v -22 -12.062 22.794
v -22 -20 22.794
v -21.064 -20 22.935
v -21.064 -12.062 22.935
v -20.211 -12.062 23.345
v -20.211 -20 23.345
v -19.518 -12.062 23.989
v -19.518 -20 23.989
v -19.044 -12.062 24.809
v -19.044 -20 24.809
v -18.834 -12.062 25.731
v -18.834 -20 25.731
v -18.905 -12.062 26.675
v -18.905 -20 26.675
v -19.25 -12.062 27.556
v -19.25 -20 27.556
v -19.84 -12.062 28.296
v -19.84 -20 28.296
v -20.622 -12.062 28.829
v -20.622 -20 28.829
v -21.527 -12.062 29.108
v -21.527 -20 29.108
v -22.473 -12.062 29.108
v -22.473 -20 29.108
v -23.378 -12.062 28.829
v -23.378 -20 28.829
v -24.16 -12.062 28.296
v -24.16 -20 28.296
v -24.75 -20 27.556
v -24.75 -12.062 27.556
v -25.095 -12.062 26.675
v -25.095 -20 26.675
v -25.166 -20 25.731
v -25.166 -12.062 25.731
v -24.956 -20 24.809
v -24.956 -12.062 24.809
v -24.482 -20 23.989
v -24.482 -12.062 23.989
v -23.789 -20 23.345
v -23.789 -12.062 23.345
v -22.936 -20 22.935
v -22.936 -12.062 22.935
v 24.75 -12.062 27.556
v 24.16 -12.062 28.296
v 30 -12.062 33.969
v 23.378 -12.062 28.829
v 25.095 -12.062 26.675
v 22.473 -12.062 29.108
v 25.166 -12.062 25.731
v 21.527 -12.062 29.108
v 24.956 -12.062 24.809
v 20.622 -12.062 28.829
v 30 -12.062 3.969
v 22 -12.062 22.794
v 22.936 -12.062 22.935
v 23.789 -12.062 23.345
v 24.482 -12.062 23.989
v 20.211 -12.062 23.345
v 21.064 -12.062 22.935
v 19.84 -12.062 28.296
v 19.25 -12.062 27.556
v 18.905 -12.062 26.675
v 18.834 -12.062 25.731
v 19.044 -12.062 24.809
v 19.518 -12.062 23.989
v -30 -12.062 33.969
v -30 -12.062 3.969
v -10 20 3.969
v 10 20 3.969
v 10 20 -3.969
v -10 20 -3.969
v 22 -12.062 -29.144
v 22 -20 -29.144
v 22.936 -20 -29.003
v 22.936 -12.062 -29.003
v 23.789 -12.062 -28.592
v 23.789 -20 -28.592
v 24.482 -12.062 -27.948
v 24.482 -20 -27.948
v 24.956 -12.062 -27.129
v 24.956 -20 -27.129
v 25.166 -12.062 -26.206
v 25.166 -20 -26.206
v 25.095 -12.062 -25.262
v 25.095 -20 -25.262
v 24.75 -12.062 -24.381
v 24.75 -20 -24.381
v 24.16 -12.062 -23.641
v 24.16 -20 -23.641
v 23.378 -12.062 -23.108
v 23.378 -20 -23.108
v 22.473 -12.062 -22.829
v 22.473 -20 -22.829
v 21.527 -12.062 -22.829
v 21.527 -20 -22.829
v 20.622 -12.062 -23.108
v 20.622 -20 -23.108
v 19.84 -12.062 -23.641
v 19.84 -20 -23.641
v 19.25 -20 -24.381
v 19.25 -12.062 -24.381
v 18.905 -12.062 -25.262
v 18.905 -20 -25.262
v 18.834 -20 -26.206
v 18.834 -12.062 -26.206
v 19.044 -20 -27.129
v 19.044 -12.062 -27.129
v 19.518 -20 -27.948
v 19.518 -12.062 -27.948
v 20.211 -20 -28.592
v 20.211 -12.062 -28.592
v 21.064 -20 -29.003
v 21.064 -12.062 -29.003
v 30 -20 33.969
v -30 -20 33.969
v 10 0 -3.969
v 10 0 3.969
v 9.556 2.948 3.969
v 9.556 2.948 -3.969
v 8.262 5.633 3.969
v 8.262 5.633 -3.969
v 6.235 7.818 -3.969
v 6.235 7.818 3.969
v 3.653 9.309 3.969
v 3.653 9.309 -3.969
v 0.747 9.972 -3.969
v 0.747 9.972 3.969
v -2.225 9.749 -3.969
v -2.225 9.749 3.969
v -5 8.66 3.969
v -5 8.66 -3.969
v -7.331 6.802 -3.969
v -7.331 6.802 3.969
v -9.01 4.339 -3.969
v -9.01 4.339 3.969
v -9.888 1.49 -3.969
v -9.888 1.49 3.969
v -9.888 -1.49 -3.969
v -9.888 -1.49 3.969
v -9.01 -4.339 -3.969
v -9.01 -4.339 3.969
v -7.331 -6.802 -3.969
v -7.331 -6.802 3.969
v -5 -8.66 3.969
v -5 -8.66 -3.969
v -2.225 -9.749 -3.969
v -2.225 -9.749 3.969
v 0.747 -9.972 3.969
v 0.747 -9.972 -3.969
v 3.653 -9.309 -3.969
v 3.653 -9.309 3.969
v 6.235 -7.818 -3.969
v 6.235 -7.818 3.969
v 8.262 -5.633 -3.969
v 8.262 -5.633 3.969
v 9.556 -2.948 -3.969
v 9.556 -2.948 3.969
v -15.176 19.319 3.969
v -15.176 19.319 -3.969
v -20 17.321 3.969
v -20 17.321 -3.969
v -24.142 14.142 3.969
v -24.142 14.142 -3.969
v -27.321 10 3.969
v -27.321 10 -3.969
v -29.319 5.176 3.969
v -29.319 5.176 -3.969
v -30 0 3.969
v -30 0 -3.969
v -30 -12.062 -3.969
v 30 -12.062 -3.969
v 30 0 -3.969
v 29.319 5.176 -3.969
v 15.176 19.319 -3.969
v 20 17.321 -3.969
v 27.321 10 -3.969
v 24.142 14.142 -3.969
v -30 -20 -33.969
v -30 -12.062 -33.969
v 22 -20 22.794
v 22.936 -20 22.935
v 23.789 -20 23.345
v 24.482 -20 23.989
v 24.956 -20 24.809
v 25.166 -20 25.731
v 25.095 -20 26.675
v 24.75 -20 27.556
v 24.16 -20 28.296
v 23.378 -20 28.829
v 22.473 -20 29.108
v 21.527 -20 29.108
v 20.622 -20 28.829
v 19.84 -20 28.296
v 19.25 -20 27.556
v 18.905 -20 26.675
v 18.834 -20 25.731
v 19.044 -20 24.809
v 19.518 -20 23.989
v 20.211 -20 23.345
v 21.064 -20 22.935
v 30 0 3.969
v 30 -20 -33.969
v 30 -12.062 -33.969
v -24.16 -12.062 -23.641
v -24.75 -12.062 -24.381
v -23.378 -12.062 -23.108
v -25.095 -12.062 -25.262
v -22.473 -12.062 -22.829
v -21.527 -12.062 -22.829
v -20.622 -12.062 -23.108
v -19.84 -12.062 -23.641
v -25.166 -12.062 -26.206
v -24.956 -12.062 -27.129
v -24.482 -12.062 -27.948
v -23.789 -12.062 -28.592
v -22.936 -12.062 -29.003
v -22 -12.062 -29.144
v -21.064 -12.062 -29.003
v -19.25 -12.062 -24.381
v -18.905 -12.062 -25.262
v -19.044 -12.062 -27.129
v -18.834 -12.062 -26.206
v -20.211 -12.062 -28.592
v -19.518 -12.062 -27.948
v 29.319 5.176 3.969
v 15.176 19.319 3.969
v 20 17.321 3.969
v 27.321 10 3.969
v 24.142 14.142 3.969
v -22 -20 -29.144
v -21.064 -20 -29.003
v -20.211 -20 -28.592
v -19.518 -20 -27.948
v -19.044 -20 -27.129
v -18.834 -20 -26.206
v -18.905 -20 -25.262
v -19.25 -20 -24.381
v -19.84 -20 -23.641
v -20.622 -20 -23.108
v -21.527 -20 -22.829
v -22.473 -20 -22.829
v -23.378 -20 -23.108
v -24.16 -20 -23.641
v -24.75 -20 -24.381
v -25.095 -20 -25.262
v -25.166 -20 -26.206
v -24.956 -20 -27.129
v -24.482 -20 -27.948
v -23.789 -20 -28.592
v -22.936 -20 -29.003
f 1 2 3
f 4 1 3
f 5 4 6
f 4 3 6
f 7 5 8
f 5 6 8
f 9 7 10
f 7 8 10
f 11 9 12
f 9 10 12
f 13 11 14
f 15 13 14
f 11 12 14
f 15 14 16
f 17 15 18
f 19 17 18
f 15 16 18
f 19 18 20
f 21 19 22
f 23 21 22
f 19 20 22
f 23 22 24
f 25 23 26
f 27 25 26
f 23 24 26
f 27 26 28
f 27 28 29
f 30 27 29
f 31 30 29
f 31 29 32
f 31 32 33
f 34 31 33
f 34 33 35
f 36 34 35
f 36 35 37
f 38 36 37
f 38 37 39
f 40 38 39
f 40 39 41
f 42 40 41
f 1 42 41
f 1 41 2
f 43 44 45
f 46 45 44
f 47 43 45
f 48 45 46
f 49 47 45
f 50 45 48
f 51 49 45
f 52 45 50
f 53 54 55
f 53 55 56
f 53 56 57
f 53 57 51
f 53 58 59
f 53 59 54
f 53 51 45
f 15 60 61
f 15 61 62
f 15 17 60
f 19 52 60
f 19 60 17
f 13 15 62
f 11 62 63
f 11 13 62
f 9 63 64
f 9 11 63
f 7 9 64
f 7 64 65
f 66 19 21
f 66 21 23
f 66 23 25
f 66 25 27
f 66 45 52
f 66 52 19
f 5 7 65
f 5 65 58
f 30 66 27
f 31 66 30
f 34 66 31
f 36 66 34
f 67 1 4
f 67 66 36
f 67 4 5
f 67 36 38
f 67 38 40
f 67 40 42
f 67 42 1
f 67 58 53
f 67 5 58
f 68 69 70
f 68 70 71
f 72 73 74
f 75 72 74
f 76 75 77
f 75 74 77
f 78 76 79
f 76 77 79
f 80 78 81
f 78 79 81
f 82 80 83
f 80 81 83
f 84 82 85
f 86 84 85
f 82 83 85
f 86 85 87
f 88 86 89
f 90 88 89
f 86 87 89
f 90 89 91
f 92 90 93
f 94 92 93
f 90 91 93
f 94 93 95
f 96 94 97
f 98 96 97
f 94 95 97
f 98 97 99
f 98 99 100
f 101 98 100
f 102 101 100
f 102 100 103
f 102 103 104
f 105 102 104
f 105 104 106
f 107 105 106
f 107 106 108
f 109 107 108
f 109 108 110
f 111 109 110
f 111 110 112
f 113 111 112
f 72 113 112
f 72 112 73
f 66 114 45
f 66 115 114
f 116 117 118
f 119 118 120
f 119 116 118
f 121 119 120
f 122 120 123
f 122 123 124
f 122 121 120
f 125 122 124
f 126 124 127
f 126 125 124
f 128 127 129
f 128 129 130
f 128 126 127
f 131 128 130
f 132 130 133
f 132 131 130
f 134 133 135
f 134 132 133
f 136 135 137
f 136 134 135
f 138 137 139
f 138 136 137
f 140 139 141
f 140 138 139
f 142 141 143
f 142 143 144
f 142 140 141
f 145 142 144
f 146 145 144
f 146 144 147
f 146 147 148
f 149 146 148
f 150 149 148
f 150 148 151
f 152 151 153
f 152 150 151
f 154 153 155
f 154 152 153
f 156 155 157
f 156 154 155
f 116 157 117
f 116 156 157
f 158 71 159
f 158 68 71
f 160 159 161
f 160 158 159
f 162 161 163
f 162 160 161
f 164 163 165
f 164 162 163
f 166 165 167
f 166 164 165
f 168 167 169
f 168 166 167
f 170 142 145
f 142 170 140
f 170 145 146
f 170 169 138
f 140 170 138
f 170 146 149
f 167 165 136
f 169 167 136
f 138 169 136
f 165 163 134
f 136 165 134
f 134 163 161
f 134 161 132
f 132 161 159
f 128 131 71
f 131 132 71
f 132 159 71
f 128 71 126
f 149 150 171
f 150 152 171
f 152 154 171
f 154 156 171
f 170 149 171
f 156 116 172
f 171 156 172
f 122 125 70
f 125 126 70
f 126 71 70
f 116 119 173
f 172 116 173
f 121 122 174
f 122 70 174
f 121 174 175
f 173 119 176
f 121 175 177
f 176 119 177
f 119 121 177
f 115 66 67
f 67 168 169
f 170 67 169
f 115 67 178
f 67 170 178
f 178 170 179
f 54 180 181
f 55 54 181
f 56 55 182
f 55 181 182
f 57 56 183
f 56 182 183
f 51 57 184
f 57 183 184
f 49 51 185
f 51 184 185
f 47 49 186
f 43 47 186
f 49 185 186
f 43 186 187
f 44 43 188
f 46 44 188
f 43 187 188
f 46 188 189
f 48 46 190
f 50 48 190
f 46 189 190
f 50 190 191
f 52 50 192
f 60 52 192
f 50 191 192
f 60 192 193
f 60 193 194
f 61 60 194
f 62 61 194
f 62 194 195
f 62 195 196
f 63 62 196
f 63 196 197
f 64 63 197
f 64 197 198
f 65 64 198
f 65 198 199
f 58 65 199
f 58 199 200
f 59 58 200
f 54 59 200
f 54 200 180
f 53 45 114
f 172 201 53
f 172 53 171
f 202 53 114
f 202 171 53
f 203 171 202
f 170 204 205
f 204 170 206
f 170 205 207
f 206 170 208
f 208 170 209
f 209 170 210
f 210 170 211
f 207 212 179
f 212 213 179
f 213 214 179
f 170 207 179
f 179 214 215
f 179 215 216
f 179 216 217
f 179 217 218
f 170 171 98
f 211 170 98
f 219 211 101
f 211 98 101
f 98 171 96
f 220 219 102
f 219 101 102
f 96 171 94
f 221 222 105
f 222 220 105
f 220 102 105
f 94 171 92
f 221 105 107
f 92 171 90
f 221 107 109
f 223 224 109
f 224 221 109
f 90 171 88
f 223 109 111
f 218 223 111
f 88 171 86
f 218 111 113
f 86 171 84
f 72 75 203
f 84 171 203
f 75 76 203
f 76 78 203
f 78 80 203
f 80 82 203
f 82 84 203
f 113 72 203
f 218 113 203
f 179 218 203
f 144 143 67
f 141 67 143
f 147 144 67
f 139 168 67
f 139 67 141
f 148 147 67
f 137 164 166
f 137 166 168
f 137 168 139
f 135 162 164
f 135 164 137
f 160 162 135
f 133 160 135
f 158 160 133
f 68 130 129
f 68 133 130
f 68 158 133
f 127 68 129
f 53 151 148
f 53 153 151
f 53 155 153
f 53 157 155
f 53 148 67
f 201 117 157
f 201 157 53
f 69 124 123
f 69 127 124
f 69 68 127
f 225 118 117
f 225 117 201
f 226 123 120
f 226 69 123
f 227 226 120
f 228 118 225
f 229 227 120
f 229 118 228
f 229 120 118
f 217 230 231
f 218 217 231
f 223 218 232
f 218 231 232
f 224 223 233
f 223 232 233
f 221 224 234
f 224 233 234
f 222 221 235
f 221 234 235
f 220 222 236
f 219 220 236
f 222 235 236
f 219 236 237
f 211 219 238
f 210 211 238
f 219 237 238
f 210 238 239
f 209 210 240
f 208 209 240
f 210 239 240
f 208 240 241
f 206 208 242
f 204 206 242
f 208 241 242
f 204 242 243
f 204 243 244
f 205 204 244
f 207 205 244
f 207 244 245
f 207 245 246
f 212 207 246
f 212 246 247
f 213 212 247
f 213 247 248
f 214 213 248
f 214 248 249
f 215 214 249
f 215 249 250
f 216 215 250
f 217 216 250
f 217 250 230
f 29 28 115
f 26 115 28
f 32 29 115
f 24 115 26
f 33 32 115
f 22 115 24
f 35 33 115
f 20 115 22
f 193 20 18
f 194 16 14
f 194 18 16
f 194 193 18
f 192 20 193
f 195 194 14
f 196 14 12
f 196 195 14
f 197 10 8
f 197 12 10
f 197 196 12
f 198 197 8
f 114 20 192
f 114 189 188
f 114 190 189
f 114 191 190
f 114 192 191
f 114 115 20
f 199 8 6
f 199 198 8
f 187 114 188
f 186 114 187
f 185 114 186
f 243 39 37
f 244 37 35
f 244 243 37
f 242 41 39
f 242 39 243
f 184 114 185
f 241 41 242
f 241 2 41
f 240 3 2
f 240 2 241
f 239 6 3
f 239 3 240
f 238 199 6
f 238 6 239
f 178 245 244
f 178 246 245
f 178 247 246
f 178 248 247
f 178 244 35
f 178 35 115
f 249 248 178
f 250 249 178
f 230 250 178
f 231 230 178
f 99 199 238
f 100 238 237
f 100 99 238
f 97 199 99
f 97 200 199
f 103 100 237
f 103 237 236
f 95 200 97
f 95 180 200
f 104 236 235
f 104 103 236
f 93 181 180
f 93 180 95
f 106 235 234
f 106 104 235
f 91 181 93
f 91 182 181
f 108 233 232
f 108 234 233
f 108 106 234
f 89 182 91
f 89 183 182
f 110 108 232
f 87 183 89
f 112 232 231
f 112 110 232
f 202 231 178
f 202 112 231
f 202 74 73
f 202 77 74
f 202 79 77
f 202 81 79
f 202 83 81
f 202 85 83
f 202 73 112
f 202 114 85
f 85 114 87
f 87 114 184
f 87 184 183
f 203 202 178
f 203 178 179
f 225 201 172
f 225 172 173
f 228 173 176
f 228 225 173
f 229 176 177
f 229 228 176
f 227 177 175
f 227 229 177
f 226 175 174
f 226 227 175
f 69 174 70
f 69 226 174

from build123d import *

# Parameters (mm, degrees)
CROQUIS1_R              = 10
SALIENTE_EXTRUIR1_DEPTH = 3.96875
CROQUIS3_W              = 30
CROQUIS3_H              = 7.9375
SALIENTE_EXTRUIR2_DEPTH = 30
CROQUIS4_R              = 3.175
CORTAR_EXTRUIR1_DEPTH   = 60


with BuildPart() as part:
    # Croquis1 → Saliente-Extruir1 (new, symmetric)
    with BuildSketch(Plane.XY):
        with BuildLine():
            Line((-30, -20), (30, -20))
            Line((30, -20), (30, 0))
            ThreePointArc((30, 0), (24.142135624, 14.142135624), (10, 20))
            Line((10, 20), (-10, 20))
            ThreePointArc((-10, 20), (-24.142135624, 14.142135624), (-30, 0))
            Line((-30, 0), (-30, -20))
        make_face()
        Circle(CROQUIS1_R, mode=Mode.SUBTRACT)
    extrude(amount=SALIENTE_EXTRUIR1_DEPTH, both=True)

    # Croquis3 → Saliente-Extruir2 (add, symmetric)
    with BuildSketch(Plane(origin=(0, 0, 0), x_dir=(0, 0, -1), z_dir=(1, 0, 0))):
        with Locations((-18.96875, -16.03125)):
            Rectangle(CROQUIS3_W, CROQUIS3_H)
        with Locations((18.96875, -16.03125)):
            Rectangle(CROQUIS3_W, CROQUIS3_H)
    extrude(amount=SALIENTE_EXTRUIR2_DEPTH, both=True)

    # Croquis4 → Cortar-Extruir1 (cut)
    with BuildSketch(Plane.XZ.offset(20)):
        with Locations(Location((-22, 25.96875, 0), (0, 0, 270))):
            Circle(CROQUIS4_R)
        with Locations(Location((22, 25.96875, 0), (0, 0, 270))):
            Circle(CROQUIS4_R)
        with Locations(Location((22, -25.96875, 0), (0, 0, 270))):
            Circle(CROQUIS4_R)
        with Locations(Location((-22, -25.96875, 0), (0, 0, 270))):
            Circle(CROQUIS4_R)
    extrude(amount=-CORTAR_EXTRUIR1_DEPTH, mode=Mode.SUBTRACT)


solid = part.part
